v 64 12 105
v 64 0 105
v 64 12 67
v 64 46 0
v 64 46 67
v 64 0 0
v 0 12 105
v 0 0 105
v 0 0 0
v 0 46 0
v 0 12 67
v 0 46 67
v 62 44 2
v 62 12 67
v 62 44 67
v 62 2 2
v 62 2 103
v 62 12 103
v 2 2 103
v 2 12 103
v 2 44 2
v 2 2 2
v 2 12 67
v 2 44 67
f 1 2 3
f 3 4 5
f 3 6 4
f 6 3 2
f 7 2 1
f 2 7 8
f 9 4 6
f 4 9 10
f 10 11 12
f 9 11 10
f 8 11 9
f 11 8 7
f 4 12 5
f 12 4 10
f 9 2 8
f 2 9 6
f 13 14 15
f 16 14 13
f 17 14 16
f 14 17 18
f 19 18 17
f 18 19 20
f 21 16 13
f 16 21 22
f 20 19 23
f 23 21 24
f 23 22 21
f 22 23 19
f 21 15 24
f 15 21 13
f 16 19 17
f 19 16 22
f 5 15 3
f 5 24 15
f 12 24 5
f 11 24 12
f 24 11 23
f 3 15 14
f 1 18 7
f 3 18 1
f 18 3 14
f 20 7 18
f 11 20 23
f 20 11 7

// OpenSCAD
difference()
{
	cube ([64,46,105]);
	translate ([2,2,2]) cube ([60,42,101]);
	translate([-2,12,67]) cube ([70,50,50]);
}
